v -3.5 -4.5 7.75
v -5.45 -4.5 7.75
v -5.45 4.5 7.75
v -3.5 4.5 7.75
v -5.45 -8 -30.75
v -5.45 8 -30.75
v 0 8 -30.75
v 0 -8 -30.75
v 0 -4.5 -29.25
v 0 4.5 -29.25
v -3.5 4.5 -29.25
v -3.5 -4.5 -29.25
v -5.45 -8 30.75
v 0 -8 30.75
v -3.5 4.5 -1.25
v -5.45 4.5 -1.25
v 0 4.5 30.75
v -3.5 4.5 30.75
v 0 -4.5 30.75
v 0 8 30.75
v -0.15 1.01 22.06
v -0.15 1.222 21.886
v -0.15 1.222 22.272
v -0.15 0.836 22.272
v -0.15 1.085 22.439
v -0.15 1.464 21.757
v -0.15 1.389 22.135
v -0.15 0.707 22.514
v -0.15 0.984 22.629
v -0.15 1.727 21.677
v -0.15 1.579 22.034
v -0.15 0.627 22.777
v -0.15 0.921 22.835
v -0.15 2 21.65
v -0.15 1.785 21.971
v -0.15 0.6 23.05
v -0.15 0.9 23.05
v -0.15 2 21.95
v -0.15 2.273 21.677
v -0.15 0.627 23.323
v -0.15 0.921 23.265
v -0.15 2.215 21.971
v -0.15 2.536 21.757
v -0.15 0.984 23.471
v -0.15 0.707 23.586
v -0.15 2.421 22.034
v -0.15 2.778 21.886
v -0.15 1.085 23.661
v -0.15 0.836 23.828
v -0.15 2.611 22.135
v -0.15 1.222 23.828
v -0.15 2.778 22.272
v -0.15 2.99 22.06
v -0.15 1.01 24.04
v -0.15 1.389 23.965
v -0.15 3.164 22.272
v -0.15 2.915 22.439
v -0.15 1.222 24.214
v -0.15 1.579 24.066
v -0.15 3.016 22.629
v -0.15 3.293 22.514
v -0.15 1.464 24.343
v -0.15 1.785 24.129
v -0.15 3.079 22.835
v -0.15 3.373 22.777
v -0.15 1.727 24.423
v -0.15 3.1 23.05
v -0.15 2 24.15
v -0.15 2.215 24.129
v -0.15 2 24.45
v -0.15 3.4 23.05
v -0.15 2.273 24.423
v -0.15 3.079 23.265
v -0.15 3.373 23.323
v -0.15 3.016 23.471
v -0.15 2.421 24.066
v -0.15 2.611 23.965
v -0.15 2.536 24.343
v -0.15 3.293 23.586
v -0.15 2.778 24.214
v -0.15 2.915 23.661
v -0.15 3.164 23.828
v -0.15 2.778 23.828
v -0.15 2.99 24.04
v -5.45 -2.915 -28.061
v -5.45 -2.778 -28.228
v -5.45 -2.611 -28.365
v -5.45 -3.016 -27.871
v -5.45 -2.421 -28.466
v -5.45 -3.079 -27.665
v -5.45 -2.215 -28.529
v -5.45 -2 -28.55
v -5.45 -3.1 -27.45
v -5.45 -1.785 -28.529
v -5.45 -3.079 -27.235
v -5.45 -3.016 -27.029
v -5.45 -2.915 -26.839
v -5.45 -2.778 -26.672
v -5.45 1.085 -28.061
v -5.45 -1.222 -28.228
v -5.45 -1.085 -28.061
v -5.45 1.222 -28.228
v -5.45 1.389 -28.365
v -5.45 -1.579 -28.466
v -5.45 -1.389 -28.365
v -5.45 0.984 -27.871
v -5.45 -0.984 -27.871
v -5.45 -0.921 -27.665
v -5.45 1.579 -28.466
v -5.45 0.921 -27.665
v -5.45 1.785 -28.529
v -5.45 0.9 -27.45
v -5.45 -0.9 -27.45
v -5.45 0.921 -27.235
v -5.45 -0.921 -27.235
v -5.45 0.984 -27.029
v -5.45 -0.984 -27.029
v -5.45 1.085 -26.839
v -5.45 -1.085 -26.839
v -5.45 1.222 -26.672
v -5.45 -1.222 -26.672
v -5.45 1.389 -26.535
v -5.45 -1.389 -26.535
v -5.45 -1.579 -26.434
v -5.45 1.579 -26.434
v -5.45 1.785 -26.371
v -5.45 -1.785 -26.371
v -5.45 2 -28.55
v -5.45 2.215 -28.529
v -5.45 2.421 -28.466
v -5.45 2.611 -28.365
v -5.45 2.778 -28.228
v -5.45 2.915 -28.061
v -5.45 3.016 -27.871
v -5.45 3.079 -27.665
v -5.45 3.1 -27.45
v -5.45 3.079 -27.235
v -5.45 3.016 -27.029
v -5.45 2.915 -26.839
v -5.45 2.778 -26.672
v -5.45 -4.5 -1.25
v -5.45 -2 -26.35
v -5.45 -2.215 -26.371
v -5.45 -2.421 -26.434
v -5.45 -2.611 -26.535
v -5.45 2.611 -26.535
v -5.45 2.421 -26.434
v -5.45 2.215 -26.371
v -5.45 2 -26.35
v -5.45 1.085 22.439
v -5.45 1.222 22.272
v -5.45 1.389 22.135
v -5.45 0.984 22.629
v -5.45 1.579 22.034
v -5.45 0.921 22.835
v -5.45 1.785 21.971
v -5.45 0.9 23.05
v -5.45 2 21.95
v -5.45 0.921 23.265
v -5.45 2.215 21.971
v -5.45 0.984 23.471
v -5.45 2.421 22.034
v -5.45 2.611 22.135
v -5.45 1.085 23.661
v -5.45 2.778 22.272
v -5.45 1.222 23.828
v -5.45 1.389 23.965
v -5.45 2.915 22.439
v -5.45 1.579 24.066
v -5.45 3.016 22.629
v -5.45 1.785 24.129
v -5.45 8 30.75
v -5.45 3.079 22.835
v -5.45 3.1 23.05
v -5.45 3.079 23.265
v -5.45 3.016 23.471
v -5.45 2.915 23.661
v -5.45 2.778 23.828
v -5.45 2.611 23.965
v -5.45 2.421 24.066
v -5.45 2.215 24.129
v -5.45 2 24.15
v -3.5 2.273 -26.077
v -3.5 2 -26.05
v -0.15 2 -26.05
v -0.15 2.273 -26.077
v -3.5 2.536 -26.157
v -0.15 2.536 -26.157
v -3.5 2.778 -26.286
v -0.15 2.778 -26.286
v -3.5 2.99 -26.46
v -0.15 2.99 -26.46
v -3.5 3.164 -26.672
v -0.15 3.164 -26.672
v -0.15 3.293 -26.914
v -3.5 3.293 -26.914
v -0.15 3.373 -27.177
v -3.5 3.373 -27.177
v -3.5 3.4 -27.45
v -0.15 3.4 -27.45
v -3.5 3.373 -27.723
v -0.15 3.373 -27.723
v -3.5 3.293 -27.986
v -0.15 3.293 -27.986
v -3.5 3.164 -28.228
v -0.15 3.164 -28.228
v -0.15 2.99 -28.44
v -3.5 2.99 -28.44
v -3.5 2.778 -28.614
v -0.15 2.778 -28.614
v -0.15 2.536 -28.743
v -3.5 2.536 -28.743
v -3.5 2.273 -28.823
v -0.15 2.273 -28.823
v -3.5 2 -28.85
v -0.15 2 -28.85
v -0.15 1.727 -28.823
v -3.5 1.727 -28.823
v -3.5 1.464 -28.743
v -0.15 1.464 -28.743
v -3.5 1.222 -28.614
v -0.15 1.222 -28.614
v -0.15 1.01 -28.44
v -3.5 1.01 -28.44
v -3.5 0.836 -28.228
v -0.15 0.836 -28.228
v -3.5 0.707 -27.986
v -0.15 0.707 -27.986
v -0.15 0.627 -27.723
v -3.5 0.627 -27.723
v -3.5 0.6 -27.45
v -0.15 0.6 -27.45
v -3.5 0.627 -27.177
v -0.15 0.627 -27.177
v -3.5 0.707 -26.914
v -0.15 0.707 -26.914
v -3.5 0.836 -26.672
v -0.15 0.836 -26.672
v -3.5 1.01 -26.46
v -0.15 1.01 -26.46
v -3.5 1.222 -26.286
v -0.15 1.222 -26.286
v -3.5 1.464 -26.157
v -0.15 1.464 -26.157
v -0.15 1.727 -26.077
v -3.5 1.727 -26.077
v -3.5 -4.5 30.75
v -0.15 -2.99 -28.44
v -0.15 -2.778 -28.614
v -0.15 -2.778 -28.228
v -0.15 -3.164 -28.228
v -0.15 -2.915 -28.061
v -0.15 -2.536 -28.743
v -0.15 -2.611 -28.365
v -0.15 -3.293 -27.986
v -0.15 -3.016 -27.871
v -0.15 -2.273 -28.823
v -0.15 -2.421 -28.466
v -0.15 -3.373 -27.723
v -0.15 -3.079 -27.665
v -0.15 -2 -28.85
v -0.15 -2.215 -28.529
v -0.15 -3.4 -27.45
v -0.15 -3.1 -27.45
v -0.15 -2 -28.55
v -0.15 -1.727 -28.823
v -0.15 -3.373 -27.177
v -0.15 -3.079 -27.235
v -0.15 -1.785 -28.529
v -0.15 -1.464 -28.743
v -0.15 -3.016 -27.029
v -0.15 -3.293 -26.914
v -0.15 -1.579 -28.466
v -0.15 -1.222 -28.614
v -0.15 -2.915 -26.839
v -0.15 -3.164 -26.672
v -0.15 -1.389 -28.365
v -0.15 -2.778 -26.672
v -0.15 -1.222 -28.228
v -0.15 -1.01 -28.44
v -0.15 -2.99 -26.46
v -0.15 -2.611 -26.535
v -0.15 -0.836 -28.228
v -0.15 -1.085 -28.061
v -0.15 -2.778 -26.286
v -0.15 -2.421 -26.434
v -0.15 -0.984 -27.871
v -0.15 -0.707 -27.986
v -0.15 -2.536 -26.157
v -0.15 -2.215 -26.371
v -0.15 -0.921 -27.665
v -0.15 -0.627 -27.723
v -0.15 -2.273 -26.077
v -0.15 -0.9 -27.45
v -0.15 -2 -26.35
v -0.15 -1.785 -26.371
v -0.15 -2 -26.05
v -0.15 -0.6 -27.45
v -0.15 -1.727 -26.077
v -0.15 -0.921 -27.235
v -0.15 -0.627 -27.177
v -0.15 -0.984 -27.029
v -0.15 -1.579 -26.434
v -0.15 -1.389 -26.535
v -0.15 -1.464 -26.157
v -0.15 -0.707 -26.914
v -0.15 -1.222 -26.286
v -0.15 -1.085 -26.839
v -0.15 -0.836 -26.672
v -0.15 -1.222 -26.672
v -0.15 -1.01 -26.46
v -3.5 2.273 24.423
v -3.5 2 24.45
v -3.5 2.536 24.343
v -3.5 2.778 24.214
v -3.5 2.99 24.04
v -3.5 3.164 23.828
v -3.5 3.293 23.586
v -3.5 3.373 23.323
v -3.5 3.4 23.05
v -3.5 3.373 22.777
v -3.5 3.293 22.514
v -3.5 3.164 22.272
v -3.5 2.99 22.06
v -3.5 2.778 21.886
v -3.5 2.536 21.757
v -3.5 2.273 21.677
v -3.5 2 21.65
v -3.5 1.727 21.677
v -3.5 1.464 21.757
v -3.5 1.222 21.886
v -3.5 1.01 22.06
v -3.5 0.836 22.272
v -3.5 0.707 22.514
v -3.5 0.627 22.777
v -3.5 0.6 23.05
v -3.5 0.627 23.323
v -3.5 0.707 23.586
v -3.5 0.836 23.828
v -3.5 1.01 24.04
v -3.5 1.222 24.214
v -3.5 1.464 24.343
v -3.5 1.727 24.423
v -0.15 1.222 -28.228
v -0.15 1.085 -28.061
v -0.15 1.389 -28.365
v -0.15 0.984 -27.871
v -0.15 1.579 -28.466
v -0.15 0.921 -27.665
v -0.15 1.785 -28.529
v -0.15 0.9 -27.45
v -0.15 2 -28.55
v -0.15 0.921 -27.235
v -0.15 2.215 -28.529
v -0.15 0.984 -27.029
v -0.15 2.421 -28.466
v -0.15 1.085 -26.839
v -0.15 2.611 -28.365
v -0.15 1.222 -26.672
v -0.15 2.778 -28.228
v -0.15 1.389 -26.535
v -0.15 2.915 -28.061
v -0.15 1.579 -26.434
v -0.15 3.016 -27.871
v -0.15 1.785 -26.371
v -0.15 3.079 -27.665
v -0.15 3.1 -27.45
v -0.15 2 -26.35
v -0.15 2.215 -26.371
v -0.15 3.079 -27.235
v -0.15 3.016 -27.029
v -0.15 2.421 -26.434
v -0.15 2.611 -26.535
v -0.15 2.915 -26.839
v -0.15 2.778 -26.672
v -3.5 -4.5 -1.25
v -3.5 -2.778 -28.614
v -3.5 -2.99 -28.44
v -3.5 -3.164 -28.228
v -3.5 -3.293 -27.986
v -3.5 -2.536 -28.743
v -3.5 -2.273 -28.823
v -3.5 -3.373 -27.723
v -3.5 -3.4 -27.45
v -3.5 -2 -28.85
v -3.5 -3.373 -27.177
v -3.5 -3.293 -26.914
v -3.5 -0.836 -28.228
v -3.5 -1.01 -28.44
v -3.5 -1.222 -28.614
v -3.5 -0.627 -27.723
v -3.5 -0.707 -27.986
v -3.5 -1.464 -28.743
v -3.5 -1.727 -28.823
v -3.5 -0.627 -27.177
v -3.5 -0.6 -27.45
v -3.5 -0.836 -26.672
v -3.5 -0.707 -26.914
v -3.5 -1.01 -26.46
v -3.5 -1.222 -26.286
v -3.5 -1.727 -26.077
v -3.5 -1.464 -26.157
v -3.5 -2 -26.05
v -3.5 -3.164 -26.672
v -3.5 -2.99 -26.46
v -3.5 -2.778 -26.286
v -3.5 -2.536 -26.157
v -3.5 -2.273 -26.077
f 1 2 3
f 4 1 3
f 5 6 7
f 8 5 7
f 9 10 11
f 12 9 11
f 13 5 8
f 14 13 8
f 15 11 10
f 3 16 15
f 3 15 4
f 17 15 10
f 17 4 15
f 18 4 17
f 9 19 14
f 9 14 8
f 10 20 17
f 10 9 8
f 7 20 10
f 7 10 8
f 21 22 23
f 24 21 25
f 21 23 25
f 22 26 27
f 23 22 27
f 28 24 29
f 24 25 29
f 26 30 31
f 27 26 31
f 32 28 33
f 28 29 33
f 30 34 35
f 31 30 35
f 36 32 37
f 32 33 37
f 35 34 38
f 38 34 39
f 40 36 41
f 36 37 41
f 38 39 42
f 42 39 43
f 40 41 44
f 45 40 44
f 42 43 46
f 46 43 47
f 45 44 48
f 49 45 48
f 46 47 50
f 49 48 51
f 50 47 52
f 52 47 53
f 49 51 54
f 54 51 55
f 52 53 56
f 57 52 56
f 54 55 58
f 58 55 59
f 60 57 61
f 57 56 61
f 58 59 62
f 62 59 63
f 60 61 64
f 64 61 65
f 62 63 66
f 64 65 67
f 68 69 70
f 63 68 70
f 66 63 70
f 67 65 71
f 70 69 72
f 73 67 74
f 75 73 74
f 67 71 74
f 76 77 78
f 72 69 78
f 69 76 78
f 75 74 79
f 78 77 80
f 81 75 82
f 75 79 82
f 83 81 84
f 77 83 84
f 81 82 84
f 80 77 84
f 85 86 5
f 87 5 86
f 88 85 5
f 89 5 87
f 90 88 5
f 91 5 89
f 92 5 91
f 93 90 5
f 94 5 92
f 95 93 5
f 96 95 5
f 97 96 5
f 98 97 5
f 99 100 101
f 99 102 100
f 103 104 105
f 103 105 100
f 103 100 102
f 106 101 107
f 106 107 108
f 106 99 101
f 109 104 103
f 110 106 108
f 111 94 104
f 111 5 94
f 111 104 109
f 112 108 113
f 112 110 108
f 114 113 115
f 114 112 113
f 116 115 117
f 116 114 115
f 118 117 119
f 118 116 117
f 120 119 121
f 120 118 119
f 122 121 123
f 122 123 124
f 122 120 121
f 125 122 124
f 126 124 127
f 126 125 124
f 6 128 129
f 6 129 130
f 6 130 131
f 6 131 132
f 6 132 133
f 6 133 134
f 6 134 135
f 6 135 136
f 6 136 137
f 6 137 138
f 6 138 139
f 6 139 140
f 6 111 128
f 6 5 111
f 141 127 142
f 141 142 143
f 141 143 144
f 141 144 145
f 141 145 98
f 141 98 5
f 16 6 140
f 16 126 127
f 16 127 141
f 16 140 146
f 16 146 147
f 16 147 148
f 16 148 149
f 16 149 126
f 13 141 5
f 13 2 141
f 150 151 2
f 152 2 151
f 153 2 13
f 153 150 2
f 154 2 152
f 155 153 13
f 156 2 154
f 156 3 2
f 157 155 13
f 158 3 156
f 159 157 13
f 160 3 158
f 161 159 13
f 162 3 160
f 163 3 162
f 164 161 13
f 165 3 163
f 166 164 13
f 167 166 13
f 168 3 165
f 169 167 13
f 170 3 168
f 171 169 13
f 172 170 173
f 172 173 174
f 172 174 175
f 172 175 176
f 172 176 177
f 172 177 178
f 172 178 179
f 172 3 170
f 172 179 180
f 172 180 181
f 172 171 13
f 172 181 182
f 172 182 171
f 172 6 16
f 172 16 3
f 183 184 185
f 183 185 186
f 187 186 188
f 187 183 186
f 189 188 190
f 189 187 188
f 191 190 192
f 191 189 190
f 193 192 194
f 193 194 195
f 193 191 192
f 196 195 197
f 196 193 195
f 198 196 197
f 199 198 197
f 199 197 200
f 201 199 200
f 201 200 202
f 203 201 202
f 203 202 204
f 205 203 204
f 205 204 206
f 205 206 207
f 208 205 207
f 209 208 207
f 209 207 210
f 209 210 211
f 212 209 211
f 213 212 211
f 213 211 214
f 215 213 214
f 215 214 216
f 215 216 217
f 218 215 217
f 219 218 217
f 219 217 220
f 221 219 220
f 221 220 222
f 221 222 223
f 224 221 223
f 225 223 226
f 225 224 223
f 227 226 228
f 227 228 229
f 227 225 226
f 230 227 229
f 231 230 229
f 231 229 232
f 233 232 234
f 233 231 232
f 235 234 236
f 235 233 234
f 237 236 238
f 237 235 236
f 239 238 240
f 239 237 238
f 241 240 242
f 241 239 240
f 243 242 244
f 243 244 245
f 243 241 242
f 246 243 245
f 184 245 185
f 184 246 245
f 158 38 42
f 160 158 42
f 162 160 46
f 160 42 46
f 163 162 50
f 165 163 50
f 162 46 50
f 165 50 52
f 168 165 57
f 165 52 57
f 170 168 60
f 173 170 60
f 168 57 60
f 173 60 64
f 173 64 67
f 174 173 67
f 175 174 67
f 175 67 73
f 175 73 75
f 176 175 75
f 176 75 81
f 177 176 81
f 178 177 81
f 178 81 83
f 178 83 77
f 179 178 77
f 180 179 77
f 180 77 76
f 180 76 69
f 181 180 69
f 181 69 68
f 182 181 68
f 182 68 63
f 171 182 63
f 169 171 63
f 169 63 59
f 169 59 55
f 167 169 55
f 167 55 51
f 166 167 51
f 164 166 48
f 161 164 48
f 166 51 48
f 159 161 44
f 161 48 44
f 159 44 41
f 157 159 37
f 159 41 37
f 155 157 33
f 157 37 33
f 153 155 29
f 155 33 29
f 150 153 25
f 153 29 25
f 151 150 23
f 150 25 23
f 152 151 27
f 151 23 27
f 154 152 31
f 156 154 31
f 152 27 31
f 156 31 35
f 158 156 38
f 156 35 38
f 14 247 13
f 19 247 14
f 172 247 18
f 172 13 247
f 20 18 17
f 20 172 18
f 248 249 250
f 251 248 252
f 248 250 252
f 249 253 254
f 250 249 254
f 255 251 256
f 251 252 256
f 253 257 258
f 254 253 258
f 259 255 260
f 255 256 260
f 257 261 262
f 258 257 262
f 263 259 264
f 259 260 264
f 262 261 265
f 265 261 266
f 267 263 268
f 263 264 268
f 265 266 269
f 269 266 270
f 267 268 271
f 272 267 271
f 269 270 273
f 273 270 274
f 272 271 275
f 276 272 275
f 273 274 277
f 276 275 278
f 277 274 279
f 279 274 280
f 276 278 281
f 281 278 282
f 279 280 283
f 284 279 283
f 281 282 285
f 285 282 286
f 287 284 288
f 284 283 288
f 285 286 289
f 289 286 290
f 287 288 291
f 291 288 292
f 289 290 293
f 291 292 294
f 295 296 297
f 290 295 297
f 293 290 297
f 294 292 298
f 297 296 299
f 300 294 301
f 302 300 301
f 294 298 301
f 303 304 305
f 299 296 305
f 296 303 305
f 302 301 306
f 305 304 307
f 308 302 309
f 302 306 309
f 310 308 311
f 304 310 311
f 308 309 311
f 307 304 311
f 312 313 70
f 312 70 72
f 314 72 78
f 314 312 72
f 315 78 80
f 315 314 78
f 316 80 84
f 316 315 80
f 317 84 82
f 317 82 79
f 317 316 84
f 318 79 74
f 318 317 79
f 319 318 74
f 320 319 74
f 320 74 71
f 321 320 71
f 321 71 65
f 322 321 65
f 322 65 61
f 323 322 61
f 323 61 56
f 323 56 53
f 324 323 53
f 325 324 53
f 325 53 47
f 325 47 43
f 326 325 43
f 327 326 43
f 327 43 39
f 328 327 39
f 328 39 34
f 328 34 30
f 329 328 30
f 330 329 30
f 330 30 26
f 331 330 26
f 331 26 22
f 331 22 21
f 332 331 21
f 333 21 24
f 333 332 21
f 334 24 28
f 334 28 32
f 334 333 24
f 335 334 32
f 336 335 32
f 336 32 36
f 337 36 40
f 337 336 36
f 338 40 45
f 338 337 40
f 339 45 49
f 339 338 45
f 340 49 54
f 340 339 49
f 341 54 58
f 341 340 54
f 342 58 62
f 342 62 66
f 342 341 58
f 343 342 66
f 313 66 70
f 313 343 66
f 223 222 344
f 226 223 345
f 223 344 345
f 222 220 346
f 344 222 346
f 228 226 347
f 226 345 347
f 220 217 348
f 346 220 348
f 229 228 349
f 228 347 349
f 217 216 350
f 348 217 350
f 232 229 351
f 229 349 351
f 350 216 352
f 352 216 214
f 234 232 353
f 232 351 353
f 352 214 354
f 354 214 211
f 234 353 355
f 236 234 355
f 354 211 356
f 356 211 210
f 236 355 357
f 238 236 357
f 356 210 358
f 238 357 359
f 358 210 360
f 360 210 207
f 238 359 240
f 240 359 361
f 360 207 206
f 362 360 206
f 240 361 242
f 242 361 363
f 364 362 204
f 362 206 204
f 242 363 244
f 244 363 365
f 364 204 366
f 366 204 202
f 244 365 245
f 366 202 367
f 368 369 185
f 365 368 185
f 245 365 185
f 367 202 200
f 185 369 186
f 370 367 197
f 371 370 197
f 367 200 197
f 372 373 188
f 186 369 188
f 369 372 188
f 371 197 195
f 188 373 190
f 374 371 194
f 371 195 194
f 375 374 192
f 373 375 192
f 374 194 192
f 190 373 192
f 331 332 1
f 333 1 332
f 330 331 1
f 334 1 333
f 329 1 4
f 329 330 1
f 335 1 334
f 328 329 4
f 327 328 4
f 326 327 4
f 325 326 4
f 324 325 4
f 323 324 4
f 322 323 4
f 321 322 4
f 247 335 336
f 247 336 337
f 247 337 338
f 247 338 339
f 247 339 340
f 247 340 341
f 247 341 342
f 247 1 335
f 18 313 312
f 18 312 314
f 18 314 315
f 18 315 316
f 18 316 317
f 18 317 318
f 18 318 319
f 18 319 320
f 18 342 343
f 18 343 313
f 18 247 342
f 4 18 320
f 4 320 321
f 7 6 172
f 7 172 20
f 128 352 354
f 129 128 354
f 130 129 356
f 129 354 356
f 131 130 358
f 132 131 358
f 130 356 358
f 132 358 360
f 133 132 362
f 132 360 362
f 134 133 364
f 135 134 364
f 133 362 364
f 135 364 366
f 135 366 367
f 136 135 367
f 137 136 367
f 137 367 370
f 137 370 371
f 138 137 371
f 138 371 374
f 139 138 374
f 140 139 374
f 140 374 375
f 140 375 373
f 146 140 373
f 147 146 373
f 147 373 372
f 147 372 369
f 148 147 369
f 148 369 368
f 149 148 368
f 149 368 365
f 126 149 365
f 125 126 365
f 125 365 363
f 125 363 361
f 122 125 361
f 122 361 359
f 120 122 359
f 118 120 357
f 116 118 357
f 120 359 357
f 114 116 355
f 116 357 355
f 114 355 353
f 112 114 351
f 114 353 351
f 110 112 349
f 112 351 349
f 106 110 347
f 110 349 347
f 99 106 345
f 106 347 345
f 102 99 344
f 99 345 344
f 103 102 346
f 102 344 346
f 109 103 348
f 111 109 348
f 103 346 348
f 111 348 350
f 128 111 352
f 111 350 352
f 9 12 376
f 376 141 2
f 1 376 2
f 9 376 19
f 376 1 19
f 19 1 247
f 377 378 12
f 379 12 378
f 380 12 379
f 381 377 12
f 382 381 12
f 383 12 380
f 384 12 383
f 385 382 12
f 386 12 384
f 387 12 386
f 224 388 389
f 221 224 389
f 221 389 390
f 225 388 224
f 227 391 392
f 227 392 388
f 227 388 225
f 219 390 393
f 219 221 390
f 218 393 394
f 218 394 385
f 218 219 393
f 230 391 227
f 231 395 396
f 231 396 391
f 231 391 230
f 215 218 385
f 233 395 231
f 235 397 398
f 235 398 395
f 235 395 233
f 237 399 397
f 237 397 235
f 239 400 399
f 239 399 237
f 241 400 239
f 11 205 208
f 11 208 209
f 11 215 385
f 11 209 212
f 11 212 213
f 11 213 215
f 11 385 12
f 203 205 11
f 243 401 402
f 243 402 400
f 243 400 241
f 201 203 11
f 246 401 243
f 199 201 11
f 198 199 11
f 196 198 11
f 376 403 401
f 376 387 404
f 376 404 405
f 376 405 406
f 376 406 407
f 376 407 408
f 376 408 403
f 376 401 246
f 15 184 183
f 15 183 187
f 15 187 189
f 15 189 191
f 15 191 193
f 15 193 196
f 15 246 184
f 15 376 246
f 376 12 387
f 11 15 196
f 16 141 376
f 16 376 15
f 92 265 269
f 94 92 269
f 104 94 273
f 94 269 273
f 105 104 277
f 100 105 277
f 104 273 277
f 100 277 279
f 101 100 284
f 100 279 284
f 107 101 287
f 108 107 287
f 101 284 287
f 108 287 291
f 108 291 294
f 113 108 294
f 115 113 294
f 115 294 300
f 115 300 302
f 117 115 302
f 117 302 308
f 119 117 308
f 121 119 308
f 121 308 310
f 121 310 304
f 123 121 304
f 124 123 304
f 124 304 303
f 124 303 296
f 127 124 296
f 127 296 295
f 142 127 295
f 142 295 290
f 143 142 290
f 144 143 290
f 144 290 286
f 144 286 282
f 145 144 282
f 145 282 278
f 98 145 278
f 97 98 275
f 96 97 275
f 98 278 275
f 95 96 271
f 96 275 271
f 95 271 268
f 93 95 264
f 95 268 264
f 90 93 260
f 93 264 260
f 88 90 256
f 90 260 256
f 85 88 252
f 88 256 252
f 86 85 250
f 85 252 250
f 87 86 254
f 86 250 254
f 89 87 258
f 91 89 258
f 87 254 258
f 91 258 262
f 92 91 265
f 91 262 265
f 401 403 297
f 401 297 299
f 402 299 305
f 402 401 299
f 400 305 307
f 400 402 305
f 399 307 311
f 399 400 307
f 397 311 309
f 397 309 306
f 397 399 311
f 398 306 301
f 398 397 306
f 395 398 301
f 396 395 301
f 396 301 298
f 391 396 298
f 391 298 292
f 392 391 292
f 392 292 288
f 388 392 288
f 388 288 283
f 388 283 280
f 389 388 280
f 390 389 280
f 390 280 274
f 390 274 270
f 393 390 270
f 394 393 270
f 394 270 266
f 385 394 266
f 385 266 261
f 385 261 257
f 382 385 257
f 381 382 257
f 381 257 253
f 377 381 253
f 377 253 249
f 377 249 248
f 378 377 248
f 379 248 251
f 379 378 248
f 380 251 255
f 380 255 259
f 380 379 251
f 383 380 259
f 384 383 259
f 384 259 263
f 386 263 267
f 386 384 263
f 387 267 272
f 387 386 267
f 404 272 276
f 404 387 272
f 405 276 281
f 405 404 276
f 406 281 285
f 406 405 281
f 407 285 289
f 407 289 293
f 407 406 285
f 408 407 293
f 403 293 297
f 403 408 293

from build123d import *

# Parameters (mm, degrees)
SKETCH9_W           = 5.45
SKETCH9_H           = 61.5
BOSS_EXTRUDE3_DEPTH = 8
SKETCH11_W          = 3.5
SKETCH11_H          = 9
CUT_EXTRUDE1_DEPTH  = 63.257148184
SKETCH12_R          = 1.4
BOSS_EXTRUDE4_DEPTH = 5.3
SKETCH13_R          = 1.1
CUT_EXTRUDE2_DEPTH  = 33.212613989
SKETCH14_W          = 4.52927803
SKETCH14_H          = 16
BOSS_EXTRUDE5_DEPTH = 1.5
SKETCH15_W          = 9
SKETCH15_H          = 9
CUT_EXTRUDE3_DEPTH  = 33.237633288


with BuildPart() as part:
    # Sketch9 → Boss-Extrude3 (new, symmetric)
    with BuildSketch(Plane(origin=(0, 0, 0), x_dir=(1, 0, 0), z_dir=(0, 1, 0))):
        with Locations((-2.725, 0)):
            Rectangle(SKETCH9_W, SKETCH9_H)
    extrude(amount=BOSS_EXTRUDE3_DEPTH, both=True)

    # Sketch11 → Cut-Extrude1 (cut, through all)
    with BuildSketch(Plane.XY.offset(30.75)):
        with Locations((-1.75, 0)):
            Rectangle(SKETCH11_W, SKETCH11_H)
    extrude(amount=-CUT_EXTRUDE1_DEPTH, mode=Mode.SUBTRACT)

    # Sketch12 → Boss-Extrude4 (add)
    with BuildSketch(Plane.ZY.offset(5.45)):
        with Locations((-27.45, 2)):
            Circle(SKETCH12_R)
        with Locations((-27.45, -2)):
            Circle(SKETCH12_R)
        with Locations((23.05, 2)):
            Circle(SKETCH12_R)
    extrude(amount=-BOSS_EXTRUDE4_DEPTH)

    # Sketch13 → Cut-Extrude2 (cut, through all)
    with BuildSketch(Plane(origin=(-0.15, 0, 0), x_dir=(0, 0, -1), z_dir=(1, 0, 0))):
        with Locations((-23.05, 2)):
            Circle(SKETCH13_R)
        with Locations((27.45, 2)):
            Circle(SKETCH13_R)
        with Locations((27.45, -2)):
            Circle(SKETCH13_R)
    extrude(amount=-CUT_EXTRUDE2_DEPTH, mode=Mode.SUBTRACT)

    # Sketch14 → Boss-Extrude5 (add)
    with BuildSketch(Plane(origin=(0, 0, -30.75), x_dir=(-1, 0, 0), z_dir=(0, 0, -1))):
        with Locations((2.264639015, 0)):
            Rectangle(SKETCH14_W, SKETCH14_H)
    extrude(amount=-BOSS_EXTRUDE5_DEPTH)

    # Sketch15 → Cut-Extrude3 (cut, through all)
    with BuildSketch(Plane.ZY.offset(5.45)):
        with Locations((3.25, 0)):
            Rectangle(SKETCH15_W, SKETCH15_H)
    extrude(amount=-CUT_EXTRUDE3_DEPTH, mode=Mode.SUBTRACT)


solid = part.part
